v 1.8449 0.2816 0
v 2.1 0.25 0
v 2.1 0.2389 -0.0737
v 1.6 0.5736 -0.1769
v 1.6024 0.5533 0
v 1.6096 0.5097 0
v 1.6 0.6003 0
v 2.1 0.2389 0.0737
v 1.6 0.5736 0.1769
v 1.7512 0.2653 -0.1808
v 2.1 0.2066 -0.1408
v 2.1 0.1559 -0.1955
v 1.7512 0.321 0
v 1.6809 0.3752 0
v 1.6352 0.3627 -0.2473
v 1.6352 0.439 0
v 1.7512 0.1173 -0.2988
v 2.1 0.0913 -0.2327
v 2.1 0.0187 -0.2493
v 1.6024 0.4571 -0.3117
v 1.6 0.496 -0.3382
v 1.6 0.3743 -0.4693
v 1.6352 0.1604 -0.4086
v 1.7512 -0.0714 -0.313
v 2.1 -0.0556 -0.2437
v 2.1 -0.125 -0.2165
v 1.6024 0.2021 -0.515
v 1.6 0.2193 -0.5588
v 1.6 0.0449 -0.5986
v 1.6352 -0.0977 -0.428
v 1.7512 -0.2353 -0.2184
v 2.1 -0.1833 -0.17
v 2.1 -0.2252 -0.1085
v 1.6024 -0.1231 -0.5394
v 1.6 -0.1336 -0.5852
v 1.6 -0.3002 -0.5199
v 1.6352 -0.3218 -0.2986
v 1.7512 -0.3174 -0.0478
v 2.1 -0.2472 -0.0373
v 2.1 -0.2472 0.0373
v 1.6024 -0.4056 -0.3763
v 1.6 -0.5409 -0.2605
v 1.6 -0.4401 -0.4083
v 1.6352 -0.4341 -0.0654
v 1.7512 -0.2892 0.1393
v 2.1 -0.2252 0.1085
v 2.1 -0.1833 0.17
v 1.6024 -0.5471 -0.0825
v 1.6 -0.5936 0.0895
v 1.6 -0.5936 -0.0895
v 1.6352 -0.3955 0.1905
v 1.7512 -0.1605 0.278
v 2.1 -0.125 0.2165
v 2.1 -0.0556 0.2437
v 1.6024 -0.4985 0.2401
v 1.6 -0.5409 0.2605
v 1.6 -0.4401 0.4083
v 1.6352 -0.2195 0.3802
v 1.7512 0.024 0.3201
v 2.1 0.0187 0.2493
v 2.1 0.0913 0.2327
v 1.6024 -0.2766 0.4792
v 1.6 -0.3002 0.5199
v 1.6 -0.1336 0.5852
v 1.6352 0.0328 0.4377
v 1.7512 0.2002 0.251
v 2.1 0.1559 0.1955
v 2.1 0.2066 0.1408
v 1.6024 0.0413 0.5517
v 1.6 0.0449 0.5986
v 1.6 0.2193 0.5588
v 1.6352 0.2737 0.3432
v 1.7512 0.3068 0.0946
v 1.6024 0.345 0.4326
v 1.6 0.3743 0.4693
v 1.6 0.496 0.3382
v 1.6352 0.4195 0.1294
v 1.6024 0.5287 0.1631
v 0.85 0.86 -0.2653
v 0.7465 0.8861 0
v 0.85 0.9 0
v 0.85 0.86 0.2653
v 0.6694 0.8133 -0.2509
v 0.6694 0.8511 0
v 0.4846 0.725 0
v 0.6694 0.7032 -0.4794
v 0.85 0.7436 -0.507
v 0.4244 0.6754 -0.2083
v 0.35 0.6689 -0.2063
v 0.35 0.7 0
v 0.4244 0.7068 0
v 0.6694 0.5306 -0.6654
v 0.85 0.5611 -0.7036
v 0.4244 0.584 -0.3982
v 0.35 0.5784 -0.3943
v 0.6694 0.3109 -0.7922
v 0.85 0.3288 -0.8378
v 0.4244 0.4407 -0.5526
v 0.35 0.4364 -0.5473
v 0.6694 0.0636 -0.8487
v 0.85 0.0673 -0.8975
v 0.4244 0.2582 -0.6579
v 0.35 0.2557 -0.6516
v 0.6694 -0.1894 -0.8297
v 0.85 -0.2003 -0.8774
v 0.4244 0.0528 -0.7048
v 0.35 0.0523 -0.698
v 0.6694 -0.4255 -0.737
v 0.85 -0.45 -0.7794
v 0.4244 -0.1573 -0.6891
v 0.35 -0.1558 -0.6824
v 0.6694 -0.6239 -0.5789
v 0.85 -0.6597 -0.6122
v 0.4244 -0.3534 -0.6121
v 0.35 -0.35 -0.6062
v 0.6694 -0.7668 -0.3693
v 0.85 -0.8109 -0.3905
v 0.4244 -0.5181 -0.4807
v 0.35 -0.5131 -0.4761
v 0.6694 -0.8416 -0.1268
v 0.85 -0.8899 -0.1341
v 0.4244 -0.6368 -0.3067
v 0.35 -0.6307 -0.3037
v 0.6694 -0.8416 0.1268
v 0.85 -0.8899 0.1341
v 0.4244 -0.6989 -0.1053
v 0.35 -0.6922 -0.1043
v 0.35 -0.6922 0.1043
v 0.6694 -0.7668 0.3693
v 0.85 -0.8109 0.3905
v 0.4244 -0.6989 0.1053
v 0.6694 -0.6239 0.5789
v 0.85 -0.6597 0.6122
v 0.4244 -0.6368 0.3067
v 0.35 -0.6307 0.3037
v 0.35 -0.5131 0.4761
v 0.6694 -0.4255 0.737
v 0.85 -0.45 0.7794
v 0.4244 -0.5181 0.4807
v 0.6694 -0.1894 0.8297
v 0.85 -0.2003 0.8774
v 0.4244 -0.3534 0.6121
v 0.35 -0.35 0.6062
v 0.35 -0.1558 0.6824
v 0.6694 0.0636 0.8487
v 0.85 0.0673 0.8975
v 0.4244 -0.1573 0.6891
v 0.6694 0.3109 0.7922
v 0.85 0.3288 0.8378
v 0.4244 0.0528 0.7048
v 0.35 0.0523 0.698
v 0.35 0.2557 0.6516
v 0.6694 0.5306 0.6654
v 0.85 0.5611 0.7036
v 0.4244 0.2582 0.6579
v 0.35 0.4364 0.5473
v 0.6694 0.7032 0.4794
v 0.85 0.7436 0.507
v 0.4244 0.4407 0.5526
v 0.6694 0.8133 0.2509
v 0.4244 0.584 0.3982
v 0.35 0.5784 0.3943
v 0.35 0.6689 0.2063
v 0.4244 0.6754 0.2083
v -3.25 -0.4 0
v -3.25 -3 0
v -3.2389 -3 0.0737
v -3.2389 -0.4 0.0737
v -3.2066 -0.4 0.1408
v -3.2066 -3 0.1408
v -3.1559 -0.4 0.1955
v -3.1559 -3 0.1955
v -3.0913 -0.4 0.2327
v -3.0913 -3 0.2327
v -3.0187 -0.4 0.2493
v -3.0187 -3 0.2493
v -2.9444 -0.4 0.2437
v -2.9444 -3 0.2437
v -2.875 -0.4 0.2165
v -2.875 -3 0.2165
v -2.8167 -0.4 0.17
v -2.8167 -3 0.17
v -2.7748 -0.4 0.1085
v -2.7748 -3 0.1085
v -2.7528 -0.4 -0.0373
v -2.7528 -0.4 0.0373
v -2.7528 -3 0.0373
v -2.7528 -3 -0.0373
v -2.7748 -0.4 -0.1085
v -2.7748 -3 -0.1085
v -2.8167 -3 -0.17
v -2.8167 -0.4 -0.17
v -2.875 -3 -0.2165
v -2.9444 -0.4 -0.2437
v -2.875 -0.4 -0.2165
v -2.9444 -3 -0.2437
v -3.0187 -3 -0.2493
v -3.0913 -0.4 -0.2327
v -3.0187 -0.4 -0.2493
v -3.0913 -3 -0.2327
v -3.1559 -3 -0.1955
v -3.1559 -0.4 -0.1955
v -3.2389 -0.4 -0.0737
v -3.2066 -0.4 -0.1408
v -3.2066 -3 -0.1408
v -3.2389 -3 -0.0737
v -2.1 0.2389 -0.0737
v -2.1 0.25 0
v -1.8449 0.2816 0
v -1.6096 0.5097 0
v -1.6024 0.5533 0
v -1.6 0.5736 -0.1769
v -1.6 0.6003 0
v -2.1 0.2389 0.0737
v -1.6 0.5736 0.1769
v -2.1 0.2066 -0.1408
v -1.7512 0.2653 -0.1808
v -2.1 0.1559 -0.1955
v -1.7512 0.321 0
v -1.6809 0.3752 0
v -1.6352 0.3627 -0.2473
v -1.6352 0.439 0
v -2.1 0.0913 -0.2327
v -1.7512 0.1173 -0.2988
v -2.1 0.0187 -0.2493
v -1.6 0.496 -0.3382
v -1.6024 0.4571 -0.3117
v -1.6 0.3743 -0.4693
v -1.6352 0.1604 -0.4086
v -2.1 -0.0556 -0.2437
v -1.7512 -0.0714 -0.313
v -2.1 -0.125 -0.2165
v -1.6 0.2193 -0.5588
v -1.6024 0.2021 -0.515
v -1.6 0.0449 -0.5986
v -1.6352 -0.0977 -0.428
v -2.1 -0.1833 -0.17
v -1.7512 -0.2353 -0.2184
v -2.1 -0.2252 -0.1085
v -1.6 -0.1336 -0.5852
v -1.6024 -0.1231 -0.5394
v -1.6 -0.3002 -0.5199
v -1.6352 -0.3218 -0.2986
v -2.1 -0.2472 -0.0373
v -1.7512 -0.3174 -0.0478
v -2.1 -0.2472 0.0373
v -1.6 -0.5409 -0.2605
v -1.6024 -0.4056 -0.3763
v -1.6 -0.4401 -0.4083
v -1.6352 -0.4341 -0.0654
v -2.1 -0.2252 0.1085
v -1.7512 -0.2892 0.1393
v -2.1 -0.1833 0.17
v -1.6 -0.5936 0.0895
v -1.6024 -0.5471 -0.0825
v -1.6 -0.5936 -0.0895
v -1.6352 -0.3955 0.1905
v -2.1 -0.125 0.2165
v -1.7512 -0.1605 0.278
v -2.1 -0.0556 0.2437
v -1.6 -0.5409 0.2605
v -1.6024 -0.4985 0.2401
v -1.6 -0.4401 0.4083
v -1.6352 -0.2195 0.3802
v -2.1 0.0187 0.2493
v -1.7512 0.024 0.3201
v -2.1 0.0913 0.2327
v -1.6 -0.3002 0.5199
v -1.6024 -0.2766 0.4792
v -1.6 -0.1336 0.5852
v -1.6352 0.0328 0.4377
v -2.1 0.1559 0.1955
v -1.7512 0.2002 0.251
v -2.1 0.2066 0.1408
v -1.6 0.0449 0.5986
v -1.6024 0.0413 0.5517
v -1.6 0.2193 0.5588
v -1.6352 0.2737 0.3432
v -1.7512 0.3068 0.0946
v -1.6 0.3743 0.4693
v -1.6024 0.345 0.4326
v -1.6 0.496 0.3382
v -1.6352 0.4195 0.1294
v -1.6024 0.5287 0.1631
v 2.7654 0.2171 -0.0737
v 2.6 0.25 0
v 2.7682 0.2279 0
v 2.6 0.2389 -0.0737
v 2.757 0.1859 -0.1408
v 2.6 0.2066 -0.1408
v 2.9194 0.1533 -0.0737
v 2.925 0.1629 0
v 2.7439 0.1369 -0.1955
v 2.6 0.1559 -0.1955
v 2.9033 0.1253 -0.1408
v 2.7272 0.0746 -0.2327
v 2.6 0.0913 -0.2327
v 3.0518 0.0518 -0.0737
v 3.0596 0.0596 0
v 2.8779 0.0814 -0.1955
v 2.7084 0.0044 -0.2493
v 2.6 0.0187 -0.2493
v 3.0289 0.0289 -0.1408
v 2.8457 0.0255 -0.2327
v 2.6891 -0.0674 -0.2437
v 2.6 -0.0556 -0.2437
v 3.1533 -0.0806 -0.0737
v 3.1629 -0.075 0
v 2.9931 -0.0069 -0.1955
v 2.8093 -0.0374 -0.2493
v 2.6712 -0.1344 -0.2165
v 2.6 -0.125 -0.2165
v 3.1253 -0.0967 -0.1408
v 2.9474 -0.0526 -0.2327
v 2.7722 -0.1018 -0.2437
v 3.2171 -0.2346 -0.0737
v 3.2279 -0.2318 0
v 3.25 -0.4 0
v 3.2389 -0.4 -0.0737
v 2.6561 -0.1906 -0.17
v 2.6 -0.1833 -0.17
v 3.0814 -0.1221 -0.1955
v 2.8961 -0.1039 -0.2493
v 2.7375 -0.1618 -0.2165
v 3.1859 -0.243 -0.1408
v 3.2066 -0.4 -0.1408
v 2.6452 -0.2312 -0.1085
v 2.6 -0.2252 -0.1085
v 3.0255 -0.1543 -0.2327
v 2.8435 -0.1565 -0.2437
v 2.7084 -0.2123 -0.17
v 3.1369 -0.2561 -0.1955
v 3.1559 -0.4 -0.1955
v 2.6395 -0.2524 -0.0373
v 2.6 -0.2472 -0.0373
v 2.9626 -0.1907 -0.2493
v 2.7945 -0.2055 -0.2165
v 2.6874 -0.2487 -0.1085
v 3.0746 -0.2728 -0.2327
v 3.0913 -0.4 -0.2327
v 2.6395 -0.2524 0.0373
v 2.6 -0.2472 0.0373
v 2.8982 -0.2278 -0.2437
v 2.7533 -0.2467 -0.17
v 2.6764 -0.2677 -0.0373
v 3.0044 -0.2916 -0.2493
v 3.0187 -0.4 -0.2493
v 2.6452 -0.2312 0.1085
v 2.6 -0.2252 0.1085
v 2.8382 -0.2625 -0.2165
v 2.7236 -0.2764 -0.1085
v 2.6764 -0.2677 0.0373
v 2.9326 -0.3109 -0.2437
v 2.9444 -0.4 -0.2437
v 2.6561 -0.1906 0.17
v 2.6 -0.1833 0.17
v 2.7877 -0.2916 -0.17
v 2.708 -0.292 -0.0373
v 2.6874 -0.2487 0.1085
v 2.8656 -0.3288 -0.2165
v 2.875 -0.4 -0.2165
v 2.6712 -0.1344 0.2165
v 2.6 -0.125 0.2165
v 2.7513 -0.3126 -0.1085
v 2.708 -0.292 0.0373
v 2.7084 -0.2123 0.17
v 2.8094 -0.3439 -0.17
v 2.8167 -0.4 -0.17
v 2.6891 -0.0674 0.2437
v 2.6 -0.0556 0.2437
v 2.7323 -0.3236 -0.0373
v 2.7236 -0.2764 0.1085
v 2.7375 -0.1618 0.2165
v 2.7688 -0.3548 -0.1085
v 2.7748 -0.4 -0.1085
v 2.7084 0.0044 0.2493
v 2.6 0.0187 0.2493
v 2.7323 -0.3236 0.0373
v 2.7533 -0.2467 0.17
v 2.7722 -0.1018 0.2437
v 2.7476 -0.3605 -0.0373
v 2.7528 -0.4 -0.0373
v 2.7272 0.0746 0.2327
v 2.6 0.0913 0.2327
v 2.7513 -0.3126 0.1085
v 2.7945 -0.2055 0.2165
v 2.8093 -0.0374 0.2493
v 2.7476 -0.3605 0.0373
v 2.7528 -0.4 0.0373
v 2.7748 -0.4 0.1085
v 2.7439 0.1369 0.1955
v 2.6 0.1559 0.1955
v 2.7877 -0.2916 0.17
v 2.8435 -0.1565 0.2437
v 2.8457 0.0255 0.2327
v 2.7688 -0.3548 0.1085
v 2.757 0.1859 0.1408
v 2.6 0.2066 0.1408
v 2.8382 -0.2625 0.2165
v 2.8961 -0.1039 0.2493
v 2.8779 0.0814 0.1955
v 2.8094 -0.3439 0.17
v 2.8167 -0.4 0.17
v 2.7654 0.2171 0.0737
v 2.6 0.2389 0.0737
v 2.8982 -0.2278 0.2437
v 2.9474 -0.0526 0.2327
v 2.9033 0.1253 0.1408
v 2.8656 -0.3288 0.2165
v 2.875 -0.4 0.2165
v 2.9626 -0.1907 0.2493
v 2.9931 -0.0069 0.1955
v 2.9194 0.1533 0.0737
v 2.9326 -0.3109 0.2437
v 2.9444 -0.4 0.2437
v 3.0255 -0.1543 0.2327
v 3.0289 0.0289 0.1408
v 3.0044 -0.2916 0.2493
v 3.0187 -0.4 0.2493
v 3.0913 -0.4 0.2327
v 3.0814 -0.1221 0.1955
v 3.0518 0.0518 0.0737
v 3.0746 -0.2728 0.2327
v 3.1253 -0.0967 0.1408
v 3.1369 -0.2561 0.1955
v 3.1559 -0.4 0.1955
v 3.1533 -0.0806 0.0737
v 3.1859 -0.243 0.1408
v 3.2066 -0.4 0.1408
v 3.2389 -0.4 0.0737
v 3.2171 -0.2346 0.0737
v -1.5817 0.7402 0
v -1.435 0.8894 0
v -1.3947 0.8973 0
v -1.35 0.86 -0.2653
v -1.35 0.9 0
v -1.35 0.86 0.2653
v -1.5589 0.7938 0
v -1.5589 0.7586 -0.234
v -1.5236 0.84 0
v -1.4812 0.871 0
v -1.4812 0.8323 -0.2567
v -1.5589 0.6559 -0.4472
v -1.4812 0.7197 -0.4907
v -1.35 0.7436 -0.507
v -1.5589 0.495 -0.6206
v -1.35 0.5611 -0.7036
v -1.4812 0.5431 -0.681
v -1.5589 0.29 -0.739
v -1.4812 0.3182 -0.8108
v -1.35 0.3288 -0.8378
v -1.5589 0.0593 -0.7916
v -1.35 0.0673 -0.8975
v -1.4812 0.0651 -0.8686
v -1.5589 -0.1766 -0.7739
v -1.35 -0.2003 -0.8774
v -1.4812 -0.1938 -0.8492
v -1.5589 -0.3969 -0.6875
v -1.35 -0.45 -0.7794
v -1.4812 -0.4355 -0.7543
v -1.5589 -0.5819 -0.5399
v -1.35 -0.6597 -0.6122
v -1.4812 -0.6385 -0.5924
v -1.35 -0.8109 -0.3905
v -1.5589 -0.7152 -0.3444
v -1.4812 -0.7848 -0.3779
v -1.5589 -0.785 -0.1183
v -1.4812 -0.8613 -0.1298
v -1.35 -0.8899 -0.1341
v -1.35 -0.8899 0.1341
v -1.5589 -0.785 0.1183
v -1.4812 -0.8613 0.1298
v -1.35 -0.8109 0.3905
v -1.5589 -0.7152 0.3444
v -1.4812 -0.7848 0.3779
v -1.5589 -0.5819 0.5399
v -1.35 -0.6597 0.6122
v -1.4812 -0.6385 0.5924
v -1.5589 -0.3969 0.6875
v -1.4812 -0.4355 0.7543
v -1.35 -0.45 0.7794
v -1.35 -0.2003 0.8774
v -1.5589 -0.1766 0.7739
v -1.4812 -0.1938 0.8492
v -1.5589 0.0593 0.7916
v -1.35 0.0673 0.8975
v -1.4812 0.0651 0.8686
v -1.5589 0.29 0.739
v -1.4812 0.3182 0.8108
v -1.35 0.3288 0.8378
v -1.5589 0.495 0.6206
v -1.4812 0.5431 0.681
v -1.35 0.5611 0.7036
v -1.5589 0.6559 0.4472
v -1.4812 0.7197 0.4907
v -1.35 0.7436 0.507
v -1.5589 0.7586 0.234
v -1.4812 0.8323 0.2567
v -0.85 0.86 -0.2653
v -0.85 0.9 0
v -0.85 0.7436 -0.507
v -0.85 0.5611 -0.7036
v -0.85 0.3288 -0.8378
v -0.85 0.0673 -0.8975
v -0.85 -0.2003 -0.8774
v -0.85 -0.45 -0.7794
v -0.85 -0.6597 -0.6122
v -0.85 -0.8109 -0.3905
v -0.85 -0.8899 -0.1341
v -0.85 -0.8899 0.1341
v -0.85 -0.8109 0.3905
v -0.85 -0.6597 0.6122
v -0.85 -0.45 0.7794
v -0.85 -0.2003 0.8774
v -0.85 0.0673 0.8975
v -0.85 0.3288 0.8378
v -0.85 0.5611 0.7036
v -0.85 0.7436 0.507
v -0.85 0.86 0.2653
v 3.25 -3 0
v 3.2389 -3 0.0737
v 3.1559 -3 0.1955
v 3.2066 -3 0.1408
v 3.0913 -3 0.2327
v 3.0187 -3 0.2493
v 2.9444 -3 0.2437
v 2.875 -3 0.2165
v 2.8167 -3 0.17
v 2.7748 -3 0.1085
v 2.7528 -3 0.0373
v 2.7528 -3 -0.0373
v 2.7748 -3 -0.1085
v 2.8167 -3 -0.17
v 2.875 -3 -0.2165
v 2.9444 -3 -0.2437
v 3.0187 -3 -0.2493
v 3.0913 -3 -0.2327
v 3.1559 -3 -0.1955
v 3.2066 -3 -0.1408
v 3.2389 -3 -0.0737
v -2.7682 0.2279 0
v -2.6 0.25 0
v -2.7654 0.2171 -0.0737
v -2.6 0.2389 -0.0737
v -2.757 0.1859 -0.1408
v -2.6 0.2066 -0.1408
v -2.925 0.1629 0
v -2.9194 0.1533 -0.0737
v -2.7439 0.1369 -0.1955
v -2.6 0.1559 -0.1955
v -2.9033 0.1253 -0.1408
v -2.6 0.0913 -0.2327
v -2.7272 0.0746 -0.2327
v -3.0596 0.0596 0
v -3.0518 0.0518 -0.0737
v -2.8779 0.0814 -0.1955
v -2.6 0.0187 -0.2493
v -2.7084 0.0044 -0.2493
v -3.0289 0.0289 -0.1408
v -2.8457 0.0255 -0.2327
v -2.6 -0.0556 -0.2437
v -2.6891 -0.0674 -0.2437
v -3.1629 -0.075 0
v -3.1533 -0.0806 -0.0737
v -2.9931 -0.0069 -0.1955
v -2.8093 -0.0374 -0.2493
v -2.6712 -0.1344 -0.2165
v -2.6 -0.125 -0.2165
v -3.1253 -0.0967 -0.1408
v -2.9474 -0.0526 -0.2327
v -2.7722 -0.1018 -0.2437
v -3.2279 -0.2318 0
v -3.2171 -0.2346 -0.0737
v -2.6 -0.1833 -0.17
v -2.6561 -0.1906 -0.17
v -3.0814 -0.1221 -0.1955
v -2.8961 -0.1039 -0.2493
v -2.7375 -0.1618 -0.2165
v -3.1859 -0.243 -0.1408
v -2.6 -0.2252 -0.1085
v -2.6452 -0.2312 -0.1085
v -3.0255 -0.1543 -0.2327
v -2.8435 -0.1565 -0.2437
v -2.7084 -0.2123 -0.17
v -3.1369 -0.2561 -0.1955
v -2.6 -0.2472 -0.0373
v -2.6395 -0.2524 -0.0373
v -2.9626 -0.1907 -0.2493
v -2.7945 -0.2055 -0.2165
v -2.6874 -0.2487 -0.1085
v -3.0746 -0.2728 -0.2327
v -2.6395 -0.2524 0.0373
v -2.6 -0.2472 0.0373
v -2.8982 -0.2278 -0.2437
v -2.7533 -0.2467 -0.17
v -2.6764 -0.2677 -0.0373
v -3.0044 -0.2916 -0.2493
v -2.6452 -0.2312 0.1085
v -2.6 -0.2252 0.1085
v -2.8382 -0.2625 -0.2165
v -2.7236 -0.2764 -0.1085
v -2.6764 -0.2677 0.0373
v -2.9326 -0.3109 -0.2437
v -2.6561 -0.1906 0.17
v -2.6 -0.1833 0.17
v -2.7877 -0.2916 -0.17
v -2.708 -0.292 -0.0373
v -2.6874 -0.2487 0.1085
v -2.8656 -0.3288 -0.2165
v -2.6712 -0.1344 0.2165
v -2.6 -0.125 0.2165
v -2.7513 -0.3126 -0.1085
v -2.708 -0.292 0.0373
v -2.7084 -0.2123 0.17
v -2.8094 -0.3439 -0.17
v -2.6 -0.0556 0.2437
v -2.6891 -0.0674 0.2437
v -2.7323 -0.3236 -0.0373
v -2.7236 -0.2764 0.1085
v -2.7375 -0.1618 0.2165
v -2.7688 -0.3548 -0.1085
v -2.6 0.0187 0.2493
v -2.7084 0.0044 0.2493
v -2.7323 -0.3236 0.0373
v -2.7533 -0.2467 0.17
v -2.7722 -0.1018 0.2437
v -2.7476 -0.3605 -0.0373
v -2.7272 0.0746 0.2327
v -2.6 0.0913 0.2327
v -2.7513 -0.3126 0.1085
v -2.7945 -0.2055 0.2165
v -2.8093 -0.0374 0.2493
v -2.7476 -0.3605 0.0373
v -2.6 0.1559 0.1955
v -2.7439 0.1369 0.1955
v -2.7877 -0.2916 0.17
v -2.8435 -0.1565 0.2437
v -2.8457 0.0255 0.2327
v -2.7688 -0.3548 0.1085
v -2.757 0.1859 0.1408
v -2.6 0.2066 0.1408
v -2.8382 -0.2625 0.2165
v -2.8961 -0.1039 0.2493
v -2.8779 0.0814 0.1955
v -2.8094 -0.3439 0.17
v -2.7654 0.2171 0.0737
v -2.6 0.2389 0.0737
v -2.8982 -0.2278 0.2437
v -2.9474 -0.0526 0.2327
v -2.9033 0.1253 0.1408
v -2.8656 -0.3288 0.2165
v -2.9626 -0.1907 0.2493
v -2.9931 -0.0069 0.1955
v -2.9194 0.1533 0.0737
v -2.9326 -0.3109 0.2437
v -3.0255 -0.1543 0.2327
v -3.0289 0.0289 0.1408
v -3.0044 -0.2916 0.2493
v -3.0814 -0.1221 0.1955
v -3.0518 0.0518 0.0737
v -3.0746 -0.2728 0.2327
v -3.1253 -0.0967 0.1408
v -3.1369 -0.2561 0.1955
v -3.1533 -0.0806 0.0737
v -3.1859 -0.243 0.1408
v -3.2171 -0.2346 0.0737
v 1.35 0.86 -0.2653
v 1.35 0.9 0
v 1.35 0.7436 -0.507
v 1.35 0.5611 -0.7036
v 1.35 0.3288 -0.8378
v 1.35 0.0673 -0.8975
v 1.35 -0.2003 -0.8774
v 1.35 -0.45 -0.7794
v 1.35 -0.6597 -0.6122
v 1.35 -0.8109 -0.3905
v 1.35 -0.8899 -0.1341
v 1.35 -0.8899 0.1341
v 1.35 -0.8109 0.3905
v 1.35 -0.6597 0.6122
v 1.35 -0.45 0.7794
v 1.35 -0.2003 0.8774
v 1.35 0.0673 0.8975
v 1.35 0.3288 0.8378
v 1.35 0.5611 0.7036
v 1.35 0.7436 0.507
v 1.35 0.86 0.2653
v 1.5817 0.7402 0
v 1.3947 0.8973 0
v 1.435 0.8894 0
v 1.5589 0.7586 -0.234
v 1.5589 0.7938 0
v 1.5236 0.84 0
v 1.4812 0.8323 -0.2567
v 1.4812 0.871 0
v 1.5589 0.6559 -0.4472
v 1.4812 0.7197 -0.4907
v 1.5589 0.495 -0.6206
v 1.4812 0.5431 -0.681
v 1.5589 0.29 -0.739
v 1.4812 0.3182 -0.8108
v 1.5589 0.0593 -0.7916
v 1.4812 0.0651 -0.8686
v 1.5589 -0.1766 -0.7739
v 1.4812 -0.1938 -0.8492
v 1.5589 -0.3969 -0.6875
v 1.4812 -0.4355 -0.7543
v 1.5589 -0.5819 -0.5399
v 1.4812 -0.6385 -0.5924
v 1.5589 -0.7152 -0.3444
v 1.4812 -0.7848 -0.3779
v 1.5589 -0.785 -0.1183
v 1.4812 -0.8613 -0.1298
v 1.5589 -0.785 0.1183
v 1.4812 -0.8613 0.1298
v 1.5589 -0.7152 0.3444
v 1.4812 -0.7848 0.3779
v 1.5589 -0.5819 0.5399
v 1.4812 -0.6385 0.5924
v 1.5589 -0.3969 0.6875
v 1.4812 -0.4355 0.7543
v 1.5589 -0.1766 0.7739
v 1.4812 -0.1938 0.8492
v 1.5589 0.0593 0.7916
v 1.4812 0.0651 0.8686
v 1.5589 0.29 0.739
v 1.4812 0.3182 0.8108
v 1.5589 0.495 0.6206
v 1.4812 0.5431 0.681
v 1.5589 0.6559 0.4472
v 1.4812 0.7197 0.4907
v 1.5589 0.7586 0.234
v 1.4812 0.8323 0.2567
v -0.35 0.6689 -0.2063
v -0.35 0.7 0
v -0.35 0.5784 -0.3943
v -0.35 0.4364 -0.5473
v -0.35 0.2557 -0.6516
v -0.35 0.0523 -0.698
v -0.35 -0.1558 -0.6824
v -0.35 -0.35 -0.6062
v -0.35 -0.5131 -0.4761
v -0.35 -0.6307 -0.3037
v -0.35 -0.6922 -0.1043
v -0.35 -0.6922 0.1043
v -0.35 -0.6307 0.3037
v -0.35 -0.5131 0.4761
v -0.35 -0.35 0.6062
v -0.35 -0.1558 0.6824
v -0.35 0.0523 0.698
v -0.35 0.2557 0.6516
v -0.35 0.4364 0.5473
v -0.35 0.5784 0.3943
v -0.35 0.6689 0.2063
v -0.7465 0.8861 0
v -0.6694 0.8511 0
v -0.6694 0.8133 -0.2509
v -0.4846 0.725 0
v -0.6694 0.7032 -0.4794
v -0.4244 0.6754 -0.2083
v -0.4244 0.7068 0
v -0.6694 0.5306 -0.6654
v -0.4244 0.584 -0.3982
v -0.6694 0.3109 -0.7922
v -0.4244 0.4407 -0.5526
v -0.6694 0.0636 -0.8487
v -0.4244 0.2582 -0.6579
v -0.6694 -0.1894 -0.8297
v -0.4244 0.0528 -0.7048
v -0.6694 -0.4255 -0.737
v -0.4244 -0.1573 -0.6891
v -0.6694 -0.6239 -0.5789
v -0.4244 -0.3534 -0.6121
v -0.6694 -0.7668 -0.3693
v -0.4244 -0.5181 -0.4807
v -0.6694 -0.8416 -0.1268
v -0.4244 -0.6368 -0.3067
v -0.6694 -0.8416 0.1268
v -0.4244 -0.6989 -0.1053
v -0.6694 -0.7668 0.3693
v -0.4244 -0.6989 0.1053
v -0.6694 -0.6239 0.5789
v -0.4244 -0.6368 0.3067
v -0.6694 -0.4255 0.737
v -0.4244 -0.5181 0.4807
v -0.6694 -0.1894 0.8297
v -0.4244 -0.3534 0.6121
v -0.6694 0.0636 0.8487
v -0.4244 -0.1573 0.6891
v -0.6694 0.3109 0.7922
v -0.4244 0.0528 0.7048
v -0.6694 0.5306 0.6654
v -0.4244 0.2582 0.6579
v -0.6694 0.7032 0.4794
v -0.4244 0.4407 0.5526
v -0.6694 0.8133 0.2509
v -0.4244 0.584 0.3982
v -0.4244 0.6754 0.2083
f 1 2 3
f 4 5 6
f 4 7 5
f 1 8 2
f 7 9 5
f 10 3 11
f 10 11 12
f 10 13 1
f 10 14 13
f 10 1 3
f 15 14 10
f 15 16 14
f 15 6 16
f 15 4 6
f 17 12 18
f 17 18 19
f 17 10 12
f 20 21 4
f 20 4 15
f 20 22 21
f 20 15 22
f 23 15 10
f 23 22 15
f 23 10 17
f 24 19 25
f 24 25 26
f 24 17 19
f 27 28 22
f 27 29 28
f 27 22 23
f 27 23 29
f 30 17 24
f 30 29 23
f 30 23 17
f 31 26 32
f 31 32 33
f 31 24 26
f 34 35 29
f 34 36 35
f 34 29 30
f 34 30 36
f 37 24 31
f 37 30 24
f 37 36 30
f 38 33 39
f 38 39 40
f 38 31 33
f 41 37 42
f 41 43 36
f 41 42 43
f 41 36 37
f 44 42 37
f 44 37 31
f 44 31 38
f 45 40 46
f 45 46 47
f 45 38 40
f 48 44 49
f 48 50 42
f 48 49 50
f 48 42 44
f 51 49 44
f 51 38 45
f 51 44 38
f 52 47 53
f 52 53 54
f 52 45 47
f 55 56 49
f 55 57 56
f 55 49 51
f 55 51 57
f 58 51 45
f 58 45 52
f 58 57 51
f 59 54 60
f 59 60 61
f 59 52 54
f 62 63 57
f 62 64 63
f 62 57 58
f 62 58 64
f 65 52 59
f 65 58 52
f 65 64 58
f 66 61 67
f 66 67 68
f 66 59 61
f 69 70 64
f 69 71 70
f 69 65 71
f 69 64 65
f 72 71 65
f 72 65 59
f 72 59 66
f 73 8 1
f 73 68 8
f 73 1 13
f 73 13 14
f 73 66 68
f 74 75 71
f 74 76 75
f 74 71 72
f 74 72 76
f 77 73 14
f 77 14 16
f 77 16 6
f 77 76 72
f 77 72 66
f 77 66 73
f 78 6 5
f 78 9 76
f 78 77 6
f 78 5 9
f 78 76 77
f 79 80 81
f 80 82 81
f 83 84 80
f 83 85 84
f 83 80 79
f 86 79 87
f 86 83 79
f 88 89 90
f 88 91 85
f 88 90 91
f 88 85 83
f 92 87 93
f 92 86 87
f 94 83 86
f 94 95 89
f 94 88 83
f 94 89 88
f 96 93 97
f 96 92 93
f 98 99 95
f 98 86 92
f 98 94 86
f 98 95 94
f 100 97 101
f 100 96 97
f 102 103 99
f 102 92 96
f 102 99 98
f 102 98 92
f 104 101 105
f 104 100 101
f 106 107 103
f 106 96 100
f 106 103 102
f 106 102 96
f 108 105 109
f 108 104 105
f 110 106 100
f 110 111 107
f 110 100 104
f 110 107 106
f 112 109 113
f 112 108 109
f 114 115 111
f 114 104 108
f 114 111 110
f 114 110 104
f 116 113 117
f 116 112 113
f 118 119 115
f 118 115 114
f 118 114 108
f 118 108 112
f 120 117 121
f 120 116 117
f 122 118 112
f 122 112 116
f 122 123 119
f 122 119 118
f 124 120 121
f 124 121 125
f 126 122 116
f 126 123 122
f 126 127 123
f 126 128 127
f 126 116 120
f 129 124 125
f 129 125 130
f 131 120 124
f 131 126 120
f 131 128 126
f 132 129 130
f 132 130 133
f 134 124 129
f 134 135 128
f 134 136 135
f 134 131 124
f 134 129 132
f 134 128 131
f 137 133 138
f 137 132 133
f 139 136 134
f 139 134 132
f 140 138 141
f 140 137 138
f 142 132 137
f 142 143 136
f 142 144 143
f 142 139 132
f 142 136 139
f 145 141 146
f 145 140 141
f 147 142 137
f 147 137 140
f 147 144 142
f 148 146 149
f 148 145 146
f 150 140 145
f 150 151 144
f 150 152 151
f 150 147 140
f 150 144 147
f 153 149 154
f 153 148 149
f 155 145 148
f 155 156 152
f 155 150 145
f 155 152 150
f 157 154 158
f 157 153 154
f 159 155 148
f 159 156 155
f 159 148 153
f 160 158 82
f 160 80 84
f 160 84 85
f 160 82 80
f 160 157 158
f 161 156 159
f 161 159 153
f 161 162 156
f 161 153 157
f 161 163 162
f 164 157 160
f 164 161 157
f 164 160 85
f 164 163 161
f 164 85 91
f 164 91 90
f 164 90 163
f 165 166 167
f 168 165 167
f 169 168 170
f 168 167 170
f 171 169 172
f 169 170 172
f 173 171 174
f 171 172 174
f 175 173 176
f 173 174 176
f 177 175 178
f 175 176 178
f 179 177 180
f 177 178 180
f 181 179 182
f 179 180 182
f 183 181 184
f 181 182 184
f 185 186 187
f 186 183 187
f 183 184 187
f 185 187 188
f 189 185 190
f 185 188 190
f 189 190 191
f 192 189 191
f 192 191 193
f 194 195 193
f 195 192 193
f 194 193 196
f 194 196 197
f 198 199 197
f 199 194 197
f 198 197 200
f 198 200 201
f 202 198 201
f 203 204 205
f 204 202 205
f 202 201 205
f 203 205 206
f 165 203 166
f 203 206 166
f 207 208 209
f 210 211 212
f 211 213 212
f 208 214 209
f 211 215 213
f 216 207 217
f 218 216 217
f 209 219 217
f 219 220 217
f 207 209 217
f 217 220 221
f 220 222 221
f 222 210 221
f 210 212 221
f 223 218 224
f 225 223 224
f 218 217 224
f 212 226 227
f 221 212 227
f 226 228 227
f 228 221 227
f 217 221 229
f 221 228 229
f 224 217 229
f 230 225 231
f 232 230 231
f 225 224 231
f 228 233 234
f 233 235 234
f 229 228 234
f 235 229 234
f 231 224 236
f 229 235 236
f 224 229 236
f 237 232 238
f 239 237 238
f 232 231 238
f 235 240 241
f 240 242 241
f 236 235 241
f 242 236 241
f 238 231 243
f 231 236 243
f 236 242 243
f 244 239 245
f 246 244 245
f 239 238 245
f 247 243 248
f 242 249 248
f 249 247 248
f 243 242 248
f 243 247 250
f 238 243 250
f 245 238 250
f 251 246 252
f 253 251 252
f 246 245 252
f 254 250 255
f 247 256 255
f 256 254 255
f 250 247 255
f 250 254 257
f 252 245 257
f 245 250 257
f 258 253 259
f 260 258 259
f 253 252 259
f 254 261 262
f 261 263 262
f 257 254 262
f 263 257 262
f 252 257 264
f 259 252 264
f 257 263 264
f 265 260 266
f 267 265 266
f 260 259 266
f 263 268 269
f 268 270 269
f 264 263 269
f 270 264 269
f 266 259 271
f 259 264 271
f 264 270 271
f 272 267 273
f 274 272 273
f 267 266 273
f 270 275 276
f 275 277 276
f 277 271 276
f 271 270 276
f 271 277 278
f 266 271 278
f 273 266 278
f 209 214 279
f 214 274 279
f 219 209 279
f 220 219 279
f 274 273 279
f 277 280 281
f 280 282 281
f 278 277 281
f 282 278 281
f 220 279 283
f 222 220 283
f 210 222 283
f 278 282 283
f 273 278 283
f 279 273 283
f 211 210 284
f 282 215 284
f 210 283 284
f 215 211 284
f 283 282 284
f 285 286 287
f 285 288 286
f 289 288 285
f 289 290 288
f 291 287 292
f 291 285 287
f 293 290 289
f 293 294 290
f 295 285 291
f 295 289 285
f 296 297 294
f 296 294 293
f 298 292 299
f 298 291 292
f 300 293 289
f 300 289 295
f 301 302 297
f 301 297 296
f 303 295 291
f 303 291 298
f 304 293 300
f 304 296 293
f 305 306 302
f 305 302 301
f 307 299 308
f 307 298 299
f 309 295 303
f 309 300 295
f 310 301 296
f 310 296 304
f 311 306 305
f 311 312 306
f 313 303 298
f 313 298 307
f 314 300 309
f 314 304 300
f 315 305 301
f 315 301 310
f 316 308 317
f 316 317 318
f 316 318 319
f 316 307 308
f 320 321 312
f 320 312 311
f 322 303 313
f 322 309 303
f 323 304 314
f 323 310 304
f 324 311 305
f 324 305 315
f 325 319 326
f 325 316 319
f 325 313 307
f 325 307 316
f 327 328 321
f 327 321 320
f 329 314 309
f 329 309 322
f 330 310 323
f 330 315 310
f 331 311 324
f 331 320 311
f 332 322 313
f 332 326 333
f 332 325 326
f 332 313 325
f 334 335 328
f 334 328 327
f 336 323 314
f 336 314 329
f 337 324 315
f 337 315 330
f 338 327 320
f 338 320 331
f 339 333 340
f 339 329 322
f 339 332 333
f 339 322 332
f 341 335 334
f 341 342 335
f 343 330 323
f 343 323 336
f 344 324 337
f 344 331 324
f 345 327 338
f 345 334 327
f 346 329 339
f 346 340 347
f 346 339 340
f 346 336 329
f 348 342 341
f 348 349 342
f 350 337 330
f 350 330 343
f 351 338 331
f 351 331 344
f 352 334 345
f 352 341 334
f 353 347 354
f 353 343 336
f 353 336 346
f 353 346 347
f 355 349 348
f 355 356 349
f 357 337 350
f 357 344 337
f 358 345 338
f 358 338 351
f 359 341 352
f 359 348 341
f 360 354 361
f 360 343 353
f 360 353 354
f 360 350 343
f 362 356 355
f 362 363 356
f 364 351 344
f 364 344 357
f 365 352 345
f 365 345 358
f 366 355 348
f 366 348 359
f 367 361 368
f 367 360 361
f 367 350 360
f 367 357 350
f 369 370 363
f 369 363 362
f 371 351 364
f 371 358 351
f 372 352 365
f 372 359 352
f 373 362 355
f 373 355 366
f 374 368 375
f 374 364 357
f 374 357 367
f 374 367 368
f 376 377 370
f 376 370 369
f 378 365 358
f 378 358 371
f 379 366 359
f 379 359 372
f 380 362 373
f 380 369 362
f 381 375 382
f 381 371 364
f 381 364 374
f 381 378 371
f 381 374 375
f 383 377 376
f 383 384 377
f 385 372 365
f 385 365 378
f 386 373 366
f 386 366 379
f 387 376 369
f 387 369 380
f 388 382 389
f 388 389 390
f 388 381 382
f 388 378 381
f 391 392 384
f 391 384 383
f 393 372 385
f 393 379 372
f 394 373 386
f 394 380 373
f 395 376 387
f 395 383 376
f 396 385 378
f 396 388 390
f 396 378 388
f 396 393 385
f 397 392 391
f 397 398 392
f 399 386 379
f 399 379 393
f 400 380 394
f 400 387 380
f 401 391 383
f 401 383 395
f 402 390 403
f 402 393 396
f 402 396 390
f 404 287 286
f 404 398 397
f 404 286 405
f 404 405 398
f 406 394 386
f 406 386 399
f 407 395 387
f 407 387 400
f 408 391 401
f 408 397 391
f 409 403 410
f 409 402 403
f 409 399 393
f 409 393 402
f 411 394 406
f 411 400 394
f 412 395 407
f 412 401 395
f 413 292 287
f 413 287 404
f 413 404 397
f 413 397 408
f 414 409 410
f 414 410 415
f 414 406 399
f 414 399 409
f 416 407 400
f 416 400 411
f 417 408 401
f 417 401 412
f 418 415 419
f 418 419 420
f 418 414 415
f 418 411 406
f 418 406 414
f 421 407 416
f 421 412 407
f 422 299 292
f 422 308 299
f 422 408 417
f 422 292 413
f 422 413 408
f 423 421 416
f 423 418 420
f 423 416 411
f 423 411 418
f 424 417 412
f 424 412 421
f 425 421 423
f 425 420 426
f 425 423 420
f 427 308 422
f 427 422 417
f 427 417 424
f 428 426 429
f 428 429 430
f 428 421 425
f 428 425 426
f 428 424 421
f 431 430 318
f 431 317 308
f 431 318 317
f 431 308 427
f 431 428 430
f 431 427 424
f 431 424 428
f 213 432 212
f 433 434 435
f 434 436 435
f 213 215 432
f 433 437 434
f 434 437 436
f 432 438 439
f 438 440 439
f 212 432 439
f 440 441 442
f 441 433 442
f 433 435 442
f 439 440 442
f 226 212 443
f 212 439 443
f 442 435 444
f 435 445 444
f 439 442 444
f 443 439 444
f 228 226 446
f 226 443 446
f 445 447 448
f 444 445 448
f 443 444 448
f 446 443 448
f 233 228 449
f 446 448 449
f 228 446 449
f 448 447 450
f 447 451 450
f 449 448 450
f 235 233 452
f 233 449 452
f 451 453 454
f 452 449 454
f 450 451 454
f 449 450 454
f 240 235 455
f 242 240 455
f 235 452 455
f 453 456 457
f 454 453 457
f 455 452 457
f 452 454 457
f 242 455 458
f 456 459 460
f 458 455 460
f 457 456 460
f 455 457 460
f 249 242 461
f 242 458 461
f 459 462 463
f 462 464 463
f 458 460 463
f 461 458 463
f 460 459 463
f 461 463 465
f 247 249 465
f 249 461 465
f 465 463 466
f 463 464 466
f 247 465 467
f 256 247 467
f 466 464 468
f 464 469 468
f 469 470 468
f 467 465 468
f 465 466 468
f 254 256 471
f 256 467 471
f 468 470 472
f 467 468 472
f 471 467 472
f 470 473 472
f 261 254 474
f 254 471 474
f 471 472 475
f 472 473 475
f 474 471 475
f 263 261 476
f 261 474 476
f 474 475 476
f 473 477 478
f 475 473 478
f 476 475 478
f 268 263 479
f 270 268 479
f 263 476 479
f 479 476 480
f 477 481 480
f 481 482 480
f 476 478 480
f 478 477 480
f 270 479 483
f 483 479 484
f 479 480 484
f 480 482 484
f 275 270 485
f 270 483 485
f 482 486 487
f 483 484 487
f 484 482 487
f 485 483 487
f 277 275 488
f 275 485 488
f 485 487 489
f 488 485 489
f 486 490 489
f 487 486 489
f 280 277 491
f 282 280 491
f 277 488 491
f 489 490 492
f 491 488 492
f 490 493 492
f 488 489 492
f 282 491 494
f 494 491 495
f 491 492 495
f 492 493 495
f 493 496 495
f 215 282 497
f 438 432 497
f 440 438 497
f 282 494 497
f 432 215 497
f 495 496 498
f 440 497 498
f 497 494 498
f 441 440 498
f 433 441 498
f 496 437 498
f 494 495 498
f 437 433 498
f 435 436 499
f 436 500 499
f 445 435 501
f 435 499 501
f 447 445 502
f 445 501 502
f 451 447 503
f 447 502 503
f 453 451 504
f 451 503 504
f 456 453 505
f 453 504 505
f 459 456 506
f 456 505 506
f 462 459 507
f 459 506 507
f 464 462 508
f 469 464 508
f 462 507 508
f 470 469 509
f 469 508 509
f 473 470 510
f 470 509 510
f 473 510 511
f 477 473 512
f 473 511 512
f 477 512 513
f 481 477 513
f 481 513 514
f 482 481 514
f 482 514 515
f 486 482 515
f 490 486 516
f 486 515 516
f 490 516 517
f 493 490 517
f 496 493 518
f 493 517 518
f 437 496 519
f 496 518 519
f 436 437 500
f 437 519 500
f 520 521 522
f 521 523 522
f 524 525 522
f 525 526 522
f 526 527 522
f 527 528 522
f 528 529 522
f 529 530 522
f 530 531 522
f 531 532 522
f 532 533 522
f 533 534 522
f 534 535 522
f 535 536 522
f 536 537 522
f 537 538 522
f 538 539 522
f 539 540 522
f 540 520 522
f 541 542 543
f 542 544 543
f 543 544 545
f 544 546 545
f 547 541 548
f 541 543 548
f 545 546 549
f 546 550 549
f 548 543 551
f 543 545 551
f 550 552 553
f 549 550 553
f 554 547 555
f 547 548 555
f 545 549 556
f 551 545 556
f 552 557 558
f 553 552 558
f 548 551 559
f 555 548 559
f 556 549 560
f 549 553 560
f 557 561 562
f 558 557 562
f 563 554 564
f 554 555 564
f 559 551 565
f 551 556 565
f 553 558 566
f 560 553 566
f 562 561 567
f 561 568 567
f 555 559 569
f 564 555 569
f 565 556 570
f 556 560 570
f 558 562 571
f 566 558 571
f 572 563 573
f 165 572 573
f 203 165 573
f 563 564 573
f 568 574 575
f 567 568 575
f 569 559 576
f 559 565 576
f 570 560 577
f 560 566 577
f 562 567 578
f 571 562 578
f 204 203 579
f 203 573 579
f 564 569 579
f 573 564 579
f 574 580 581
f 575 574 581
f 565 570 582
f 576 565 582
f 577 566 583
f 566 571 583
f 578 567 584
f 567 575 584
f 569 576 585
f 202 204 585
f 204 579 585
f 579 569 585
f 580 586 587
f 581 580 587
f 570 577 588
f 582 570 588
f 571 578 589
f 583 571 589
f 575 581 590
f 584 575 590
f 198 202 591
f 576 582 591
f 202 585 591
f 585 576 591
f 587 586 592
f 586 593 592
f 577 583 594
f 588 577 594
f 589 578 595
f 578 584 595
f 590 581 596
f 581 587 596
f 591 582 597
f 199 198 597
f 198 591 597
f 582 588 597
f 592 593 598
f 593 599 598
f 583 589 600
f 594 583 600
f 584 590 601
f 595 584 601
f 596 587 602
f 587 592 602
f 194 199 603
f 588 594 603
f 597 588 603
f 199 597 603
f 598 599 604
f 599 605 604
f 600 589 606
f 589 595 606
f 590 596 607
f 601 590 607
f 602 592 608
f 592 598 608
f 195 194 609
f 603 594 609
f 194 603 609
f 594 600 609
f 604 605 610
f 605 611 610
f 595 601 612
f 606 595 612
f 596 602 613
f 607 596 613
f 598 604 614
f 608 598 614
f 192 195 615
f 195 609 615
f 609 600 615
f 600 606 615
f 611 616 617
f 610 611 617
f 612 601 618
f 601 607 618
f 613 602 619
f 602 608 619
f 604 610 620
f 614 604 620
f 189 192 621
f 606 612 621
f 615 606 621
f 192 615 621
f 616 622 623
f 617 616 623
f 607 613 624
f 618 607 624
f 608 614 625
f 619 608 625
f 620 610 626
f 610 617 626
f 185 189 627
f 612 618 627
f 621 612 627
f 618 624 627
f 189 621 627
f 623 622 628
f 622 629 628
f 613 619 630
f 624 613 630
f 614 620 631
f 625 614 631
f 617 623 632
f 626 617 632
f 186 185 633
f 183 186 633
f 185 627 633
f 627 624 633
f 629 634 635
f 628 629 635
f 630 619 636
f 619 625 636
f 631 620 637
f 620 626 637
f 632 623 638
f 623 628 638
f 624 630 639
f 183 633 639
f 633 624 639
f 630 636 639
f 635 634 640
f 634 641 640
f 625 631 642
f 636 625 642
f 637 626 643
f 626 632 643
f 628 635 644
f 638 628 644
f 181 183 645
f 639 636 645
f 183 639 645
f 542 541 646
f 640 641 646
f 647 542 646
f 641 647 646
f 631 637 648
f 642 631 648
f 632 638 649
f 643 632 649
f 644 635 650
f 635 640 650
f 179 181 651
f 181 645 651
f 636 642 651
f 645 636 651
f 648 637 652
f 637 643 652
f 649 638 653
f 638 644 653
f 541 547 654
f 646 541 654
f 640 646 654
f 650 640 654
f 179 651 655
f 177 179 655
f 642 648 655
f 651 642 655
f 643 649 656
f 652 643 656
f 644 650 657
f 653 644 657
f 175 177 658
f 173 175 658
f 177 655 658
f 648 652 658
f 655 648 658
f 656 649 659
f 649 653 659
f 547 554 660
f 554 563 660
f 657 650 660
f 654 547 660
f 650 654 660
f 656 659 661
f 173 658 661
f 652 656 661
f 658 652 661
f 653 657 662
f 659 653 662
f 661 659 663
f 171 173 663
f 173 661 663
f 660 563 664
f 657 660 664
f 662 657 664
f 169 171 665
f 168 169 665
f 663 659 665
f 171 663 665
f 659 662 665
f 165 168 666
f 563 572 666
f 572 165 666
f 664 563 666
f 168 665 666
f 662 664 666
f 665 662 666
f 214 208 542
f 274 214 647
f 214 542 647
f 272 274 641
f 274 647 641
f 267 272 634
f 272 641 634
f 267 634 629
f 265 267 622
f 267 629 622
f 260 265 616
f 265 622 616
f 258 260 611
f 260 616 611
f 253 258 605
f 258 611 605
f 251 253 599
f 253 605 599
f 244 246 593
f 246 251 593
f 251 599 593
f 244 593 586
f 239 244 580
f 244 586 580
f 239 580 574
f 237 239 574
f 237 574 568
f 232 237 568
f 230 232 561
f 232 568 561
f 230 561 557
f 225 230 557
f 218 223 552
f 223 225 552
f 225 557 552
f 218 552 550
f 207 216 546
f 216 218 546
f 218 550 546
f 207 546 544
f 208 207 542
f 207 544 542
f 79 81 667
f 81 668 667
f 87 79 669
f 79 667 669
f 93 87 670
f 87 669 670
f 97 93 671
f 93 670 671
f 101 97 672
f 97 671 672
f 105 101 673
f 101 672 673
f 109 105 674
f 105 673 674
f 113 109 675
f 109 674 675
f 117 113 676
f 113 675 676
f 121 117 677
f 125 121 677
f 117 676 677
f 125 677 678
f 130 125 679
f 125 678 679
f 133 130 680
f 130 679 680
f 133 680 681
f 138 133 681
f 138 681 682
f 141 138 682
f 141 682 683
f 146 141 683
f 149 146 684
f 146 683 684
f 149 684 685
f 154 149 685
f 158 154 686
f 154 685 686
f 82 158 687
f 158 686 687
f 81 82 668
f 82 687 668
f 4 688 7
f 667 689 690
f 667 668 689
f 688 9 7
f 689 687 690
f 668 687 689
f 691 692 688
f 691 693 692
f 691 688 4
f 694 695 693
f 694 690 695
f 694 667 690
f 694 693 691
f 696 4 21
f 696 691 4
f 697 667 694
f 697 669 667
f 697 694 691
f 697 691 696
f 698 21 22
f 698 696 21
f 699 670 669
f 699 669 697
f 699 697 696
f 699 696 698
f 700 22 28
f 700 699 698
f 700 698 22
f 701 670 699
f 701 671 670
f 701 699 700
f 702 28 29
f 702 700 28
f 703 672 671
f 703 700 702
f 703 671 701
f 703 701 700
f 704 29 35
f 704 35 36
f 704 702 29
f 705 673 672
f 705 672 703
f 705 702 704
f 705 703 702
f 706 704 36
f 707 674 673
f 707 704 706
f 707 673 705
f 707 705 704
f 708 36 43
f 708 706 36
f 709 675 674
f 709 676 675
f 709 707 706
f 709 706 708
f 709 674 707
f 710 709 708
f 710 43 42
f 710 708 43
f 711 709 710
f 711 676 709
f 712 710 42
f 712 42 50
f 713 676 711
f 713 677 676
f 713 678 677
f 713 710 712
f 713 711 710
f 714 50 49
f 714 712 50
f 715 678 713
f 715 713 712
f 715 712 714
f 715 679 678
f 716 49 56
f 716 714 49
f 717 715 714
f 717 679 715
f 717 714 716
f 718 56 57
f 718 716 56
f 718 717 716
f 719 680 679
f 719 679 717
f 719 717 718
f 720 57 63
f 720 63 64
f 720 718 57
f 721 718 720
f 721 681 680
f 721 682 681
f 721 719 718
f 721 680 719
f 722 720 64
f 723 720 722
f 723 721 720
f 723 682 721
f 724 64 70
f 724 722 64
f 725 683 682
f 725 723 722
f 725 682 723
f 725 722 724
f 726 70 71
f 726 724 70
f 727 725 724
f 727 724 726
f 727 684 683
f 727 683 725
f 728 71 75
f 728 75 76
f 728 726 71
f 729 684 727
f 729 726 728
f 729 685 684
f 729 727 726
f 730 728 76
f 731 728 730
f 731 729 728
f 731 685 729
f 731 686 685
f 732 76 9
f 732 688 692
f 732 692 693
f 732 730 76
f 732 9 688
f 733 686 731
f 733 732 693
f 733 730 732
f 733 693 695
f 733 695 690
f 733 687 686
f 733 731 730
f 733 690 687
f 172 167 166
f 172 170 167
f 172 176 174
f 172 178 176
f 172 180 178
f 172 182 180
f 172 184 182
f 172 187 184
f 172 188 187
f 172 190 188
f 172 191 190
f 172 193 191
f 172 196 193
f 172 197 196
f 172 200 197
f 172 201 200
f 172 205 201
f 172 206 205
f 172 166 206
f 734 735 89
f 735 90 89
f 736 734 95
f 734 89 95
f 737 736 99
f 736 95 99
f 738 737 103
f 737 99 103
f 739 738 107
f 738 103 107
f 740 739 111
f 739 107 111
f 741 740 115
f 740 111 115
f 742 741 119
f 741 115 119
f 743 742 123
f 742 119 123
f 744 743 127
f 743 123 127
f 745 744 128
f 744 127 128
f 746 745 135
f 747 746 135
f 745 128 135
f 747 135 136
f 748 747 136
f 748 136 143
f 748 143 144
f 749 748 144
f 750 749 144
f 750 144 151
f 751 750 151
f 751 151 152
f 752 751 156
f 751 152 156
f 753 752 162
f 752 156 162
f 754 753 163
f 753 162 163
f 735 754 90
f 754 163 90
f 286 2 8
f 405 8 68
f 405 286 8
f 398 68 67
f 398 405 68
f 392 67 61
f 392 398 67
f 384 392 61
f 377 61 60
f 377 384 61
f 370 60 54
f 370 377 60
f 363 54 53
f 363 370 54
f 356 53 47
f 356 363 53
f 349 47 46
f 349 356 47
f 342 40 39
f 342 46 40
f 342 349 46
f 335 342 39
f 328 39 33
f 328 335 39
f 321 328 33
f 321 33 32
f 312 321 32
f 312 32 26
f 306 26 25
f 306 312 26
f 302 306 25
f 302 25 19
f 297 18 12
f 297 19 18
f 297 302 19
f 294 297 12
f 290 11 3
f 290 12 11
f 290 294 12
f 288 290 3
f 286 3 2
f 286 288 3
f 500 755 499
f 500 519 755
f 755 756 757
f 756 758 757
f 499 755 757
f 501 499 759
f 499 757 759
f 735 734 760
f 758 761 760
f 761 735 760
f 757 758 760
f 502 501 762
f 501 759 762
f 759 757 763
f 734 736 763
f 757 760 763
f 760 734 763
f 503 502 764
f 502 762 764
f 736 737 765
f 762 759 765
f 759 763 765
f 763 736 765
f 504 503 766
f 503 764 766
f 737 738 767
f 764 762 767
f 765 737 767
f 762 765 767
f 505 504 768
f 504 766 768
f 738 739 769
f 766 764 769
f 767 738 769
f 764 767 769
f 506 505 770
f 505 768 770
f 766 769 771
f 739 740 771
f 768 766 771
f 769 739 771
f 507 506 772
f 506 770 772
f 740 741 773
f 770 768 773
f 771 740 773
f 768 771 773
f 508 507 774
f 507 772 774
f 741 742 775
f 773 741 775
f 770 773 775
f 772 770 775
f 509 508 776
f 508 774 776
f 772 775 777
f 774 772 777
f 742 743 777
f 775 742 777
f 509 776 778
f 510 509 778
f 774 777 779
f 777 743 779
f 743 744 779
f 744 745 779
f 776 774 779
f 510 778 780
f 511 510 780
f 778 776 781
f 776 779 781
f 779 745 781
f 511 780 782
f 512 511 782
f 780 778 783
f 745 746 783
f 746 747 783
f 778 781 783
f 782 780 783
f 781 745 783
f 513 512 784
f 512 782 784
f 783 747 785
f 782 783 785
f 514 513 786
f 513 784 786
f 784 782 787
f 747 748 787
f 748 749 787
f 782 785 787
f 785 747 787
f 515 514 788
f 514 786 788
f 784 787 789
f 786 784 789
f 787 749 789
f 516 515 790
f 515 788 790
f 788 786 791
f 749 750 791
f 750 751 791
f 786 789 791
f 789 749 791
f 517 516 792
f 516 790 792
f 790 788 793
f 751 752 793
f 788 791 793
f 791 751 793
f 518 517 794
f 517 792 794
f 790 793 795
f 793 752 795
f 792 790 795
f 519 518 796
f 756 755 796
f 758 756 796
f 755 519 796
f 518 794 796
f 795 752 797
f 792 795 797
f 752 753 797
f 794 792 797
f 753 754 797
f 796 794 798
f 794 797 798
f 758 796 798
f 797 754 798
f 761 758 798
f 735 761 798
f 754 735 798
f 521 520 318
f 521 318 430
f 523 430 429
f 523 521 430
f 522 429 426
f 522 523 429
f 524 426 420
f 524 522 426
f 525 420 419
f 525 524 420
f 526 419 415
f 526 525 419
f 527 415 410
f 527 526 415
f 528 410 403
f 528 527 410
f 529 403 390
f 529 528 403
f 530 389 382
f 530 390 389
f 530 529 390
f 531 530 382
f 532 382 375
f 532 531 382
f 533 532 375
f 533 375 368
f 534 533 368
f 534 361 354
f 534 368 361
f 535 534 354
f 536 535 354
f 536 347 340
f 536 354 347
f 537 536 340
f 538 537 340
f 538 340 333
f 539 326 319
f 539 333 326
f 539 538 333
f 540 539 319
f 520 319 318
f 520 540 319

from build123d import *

# Parameters (mm, degrees)
SKETCH_3_R = 0.25


with BuildPart() as part:
    # Эскиз1 → Повернуть1 (revolve)
    with BuildSketch(Plane.XY):
        with BuildLine():
            Line((-0.35, 0.7), (0.35, 0.7))
            add(Edge.make_bspline(
                [(0.85, 0.9), (0.6, 0.9), (0.6, 0.7), (0.35, 0.7)],
                knots=[0, 0, 0, 0, 1, 1, 1, 1], degree=3))
            Line((0.85, 0.9), (1.35, 0.9))
            add(Edge.make_bspline(
                [(1.599999925, 0.600300016), (1.599897388, 0.899876961), (1.35, 0.9)],
                knots=[0, 0, 0, 1, 1, 1], degree=2))
            add(Edge.make_bspline(
                [(2.1, 0.25), (1.599859003, 0.250201318), (1.599999925, 0.600300016)],
                knots=[0, 0, 0, 1, 1, 1], degree=2))
            Line((2.1, 0.25), (2.1, 0))
            Line((2.1, 0), (-2.1, 0))
            Line((-2.1, 0), (-2.1, 0.25))
            add(Edge.make_bspline(
                [(-2.1, 0.25), (-1.599859003, 0.250201318), (-1.599999925, 0.600300016)],
                knots=[0, 0, 0, 1, 1, 1], degree=2))
            add(Edge.make_bspline(
                [(-1.599999925, 0.600300016), (-1.599897388, 0.899876961), (-1.35, 0.9)],
                knots=[0, 0, 0, 1, 1, 1], degree=2))
            Line((-1.35, 0.9), (-0.85, 0.9))
            add(Edge.make_bspline(
                [(-0.85, 0.9), (-0.6, 0.9), (-0.6, 0.7), (-0.35, 0.7)],
                knots=[0, 0, 0, 0, 1, 1, 1, 1], degree=3))
        make_face()
    revolve(axis=Axis((2.1, 0, 0), (-1, 0, 0)))

    # По траектории1: sweep along a path in Эскиз2
    with BuildLine(Plane.XY) as sweep_1_path:
        Line((0, 0), (2.6, 0))
        ThreePointArc((2.6, 0), (2.882842712, -0.117157288), (3, -0.4))
        Line((3, -0.4), (3, -3))
    # Эскиз3 → По траектории1 (sweep)
    with BuildSketch(Plane(origin=(0, -3, 0), x_dir=(1, 0, 0), z_dir=(0, 1, 0))):
        with Locations((3, 0)):
            Circle(SKETCH_3_R)
    sweep_1 = sweep(path=sweep_1_path.line)

    # Зеркальное отражение1: По траектории1 across plane
    add(sweep_1.mirror(Plane(origin=(0, 0, 0), x_dir=(0, 0, 1), z_dir=(1, 0, 0))))


solid = part.part
